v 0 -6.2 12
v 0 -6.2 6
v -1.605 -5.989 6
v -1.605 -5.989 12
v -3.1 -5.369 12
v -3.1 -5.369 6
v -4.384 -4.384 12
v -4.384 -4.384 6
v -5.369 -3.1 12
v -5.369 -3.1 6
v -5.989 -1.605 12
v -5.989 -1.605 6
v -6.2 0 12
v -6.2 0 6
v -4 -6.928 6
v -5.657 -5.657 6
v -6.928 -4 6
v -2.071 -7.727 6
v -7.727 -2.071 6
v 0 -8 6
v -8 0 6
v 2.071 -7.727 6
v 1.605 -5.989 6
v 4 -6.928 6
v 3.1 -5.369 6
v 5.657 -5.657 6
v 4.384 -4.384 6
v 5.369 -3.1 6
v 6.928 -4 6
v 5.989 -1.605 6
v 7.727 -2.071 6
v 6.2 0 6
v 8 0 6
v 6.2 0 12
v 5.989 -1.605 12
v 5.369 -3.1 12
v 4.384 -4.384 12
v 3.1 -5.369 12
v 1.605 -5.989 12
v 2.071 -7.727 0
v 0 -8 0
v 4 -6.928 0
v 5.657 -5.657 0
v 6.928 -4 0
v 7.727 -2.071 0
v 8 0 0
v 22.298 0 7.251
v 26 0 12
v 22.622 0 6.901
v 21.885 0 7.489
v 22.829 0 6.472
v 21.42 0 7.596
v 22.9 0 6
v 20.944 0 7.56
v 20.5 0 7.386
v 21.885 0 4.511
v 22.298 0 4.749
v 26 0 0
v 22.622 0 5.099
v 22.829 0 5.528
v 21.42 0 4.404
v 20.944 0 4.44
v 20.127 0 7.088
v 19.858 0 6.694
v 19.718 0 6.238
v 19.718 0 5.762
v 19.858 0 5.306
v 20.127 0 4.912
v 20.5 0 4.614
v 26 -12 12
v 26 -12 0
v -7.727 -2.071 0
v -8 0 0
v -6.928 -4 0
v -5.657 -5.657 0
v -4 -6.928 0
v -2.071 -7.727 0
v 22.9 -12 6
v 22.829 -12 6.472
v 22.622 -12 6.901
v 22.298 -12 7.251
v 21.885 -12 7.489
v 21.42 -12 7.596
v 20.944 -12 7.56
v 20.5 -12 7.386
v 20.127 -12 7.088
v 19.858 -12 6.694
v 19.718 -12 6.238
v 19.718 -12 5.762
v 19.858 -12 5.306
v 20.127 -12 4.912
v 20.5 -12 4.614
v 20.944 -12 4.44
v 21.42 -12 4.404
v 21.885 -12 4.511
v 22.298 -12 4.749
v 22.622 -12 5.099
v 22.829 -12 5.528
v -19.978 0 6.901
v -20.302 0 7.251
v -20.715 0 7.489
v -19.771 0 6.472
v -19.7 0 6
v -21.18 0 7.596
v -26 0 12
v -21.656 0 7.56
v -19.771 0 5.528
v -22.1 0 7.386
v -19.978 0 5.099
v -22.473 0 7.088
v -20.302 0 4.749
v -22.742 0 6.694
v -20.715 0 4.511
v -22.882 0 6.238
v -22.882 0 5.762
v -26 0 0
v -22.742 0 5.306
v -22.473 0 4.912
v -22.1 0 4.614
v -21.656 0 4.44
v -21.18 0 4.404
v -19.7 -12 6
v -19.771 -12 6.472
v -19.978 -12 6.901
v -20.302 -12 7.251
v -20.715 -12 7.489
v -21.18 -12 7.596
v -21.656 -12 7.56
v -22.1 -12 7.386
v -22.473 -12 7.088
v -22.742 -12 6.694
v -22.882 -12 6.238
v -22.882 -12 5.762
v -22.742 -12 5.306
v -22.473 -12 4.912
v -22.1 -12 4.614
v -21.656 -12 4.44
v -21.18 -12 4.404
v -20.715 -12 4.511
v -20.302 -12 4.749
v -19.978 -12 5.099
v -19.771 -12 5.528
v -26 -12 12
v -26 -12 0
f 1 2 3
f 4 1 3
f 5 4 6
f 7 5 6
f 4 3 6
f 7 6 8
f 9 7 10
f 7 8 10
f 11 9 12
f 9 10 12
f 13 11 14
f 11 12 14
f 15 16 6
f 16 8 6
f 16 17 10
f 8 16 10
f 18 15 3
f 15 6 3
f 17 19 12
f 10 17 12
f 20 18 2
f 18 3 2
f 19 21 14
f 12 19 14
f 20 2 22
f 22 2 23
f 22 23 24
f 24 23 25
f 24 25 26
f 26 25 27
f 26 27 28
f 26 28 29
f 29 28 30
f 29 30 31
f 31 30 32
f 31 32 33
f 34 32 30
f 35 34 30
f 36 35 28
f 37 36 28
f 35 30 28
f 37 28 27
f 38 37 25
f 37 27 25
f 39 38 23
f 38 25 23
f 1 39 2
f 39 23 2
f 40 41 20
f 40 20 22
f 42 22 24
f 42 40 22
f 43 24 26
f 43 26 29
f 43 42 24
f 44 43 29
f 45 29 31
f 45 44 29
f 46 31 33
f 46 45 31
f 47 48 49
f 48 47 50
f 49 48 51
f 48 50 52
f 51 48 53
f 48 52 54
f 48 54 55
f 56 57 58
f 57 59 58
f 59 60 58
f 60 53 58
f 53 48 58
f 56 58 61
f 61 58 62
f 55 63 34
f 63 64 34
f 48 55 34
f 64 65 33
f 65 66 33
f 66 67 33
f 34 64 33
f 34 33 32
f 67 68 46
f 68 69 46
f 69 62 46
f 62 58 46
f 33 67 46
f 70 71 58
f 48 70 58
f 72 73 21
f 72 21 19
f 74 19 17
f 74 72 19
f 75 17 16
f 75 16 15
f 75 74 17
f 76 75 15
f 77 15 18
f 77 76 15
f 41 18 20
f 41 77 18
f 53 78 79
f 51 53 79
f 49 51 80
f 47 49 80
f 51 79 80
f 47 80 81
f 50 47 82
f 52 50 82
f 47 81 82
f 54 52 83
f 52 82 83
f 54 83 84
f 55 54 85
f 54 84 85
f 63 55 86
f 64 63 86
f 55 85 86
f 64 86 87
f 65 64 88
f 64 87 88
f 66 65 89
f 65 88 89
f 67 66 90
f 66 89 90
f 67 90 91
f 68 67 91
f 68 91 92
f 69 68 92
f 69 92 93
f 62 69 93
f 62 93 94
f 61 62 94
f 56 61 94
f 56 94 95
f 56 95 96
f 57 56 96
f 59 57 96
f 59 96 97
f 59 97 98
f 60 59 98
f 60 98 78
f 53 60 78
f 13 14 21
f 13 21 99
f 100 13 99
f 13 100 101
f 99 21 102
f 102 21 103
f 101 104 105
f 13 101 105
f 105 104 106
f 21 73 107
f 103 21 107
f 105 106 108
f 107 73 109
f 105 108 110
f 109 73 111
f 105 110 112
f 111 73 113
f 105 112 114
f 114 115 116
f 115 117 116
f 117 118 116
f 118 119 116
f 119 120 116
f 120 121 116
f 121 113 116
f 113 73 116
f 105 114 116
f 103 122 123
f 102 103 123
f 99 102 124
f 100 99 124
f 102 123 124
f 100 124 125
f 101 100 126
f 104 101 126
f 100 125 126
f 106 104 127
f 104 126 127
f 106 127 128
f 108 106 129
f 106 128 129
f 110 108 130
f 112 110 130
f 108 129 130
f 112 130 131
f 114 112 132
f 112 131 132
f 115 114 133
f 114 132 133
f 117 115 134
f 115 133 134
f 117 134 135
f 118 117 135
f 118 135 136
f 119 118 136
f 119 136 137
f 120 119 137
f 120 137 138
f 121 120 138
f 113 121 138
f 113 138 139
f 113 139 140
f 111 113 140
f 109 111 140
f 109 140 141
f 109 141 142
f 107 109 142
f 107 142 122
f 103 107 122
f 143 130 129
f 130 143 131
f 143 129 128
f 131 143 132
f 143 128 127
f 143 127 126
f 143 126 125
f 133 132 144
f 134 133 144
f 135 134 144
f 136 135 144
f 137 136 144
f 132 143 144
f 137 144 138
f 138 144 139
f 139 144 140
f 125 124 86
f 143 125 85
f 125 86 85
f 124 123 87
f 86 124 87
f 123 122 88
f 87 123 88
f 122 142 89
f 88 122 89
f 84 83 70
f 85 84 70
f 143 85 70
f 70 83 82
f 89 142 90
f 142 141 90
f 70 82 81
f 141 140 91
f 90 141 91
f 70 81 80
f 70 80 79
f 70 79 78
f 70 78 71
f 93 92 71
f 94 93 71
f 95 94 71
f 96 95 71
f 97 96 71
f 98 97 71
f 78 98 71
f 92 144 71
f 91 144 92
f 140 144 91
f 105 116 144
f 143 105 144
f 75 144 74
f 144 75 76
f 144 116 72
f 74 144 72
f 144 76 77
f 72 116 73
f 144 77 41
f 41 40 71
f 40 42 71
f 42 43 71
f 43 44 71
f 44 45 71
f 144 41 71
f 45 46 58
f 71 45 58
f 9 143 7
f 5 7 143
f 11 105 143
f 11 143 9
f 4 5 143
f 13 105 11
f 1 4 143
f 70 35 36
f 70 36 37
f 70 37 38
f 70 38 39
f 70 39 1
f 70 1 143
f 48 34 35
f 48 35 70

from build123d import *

# Parameters (mm, degrees)
F2_DEPTH = 12
F3_DEPTH = 6
F4_R     = 1.6
F5_DEPTH = 25


with BuildPart() as f2:
    # F1 (on Top) → F2 (new body)
    with BuildSketch(Plane.XY):
        with BuildLine():
            Line((8, 0), (6.2, 0))
            ThreePointArc((6.2, 0), (4.384062, -4.384062), (0, -6.2))
            Line((0, -6.2), (0, -8))
            ThreePointArc((0, -8), (5.656854, -5.656854), (8, 0))
        make_face()
        with BuildLine():
            Line((26, 0), (8, 0))
            ThreePointArc((8, 0), (5.656854, -5.656854), (0, -8))
            Line((0, -8), (0, -12))
            Line((0, -12), (26, -12))
            Line((26, -12), (26, 0))
        make_face()
        with BuildLine():
            Line((0, -8), (0, -6.2))
            ThreePointArc((0, -6.2), (-4.384062, -4.384062), (-6.2, 0))
            Line((-6.2, 0), (-8, 0))
            ThreePointArc((-8, 0), (-5.656854, -5.656854), (0, -8))
        make_face()
        with BuildLine():
            Line((0, -12), (0, -8))
            ThreePointArc((0, -8), (-5.656854, -5.656854), (-8, 0))
            Line((-8, 0), (-26, 0))
            Line((-26, 0), (-26, -12))
            Line((-26, -12), (0, -12))
        make_face()
    extrude(amount=F2_DEPTH)

    # F1 (on Top) → F3 (cut)
    with BuildSketch(Plane.XY):
        with BuildLine():
            Line((0, -8), (0, -6.2))
            ThreePointArc((0, -6.2), (-4.384062, -4.384062), (-6.2, 0))
            Line((-6.2, 0), (-8, 0))
            ThreePointArc((-8, 0), (-5.656854, -5.656854), (0, -8))
        make_face()
        with BuildLine():
            Line((8, 0), (6.2, 0))
            ThreePointArc((6.2, 0), (4.384062, -4.384062), (0, -6.2))
            Line((0, -6.2), (0, -8))
            ThreePointArc((0, -8), (5.656854, -5.656854), (8, 0))
        make_face()
    extrude(amount=F3_DEPTH, mode=Mode.SUBTRACT)

    # F4 (on face) → F5 (cut)
    with BuildSketch(Plane.XZ.offset(12)):
        with Locations((-21.3, 6)):
            Circle(F4_R)
        with Locations((21.3, 6)):
            Circle(F4_R)
    extrude(amount=-F5_DEPTH, mode=Mode.SUBTRACT)


solid = f2.part
